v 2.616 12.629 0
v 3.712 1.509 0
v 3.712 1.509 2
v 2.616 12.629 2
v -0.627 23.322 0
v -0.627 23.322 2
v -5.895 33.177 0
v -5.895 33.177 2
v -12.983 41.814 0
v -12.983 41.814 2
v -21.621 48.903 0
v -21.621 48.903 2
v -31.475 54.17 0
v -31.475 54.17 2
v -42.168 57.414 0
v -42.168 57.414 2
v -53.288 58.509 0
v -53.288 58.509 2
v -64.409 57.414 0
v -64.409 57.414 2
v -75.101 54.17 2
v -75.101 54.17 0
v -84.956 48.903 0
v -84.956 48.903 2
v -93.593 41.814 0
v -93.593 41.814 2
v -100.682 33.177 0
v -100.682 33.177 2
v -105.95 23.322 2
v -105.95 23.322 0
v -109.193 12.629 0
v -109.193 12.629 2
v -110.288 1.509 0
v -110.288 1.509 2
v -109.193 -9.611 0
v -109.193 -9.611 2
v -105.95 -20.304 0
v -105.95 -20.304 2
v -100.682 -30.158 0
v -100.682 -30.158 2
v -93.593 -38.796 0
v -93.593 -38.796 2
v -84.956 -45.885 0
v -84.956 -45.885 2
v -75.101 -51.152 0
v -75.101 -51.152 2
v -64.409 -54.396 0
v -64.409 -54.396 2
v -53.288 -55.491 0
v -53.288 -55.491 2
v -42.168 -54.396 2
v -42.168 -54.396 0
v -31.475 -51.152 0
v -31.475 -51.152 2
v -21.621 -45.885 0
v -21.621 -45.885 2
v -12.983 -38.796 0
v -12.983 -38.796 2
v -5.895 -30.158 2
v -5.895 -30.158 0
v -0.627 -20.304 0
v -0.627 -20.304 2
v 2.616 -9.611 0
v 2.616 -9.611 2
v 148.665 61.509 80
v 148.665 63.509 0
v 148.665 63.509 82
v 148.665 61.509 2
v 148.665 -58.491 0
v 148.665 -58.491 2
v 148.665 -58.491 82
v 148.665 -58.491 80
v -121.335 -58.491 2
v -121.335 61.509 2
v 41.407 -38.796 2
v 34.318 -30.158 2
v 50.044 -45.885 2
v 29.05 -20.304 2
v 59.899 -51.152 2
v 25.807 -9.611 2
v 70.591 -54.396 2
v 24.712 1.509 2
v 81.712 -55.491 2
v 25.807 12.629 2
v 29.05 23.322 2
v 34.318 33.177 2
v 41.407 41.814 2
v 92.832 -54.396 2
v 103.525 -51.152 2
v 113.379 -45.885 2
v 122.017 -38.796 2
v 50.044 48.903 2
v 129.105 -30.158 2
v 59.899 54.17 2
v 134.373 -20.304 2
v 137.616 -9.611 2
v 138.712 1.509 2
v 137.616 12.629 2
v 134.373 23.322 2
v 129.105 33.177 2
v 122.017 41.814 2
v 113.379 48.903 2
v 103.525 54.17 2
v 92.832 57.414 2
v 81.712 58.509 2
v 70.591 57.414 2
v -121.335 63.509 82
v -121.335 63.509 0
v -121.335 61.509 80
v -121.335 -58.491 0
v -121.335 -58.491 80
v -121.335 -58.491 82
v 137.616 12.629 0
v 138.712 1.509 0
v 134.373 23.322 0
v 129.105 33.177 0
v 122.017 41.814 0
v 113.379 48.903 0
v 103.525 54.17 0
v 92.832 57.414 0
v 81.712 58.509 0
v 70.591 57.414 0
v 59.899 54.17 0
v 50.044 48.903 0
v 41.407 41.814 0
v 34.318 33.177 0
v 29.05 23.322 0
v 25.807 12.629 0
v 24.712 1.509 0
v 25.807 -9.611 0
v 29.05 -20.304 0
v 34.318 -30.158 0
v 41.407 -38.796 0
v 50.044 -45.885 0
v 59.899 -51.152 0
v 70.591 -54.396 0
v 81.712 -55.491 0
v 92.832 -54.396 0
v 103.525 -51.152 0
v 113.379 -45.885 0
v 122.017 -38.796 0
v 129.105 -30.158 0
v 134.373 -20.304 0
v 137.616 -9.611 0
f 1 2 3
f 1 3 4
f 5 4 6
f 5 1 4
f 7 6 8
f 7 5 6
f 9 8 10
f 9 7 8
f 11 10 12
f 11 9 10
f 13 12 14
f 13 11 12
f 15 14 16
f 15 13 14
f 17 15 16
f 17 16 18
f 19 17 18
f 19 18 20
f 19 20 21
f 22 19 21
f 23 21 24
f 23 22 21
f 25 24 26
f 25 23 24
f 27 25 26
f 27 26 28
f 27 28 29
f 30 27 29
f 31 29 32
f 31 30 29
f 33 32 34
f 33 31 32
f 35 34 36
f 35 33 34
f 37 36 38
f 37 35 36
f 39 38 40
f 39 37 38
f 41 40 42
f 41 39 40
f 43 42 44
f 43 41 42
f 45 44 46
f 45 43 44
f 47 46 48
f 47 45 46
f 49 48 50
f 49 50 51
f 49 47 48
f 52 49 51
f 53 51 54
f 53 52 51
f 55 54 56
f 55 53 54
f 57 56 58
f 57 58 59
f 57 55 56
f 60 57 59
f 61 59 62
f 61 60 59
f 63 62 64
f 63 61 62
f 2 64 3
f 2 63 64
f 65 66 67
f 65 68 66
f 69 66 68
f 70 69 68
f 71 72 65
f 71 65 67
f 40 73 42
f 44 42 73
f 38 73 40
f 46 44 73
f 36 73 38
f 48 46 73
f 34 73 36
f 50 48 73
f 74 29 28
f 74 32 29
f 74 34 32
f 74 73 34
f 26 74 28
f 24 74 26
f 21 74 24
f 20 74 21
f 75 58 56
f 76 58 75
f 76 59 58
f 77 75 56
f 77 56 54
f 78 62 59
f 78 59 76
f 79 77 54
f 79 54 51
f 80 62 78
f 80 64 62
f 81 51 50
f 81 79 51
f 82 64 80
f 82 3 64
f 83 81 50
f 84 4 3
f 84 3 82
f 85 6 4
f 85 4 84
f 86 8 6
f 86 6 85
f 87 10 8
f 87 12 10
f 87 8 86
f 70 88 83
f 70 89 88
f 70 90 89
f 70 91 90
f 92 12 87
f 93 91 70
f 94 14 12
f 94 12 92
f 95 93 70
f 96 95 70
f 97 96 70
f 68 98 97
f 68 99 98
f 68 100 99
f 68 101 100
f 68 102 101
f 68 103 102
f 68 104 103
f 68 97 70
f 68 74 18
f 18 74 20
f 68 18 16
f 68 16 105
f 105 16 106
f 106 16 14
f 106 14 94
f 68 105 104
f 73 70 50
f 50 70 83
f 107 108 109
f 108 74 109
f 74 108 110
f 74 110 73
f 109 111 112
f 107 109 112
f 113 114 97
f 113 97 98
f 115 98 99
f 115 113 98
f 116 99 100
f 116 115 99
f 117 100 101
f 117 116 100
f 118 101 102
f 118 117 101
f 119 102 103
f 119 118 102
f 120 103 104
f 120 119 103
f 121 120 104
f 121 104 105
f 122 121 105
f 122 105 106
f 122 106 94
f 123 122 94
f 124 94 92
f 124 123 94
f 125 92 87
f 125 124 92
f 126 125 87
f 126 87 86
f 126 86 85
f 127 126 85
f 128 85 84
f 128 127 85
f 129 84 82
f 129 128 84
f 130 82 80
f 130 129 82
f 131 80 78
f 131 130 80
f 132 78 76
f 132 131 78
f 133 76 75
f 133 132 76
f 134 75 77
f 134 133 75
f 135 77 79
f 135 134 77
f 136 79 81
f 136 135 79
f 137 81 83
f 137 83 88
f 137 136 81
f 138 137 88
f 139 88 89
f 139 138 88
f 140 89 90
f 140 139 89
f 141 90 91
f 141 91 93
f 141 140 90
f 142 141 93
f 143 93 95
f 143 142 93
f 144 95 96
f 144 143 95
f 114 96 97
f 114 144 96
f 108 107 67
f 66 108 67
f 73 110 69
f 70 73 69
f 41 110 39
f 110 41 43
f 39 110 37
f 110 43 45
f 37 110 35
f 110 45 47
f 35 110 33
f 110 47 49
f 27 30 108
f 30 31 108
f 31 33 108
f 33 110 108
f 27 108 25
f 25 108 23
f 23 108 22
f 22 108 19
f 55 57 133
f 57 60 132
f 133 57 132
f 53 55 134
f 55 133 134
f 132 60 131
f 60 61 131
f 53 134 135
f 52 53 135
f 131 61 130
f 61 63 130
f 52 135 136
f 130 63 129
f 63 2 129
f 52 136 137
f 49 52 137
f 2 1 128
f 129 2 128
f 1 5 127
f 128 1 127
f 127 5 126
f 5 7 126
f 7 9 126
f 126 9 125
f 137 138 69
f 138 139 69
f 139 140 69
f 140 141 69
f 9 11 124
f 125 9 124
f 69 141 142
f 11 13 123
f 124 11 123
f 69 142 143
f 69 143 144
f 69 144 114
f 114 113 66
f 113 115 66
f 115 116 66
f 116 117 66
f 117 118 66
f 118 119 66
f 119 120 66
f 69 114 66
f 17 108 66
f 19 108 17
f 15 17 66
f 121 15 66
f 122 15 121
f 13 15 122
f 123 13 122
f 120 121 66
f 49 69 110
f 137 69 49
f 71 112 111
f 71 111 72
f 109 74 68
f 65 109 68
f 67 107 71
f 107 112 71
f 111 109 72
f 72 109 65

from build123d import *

# Parameters (mm, degrees)
F0_W          = 270
F0_H          = 2
F0_H_2        = 120
F0_R          = 57
F1_DEPTH      = 2
F2_DEPTH      = 80
F3_W          = 270
F3_H          = 2
F4_DEPTH      = 120
F4_DEPTH_BACK = 2


with BuildPart() as f1:
    # F0 (on Top) → F1 (new body)
    with BuildSketch(Plane.XY):
        with Locations((13.665279, 62.509182)):
            Rectangle(F0_W, F0_H)
        with Locations((13.665279, 1.509182)):
            Rectangle(F0_W, F0_H_2)
        with Locations((-53.288383, 1.509182)):
            Circle(F0_R, mode=Mode.SUBTRACT)
        with Locations((81.711617, 1.509182)):
            Circle(F0_R, mode=Mode.SUBTRACT)
    extrude(amount=F1_DEPTH)

    # F0 (on Top) → F2 (join)
    with BuildSketch(Plane.XY):
        with Locations((13.665279, 62.509182)):
            Rectangle(F0_W, F0_H)
    extrude(amount=F2_DEPTH)

    # F3 (on face) → F4 (join, two sides)
    with BuildSketch(Plane.XZ.offset(-61.509182)) as f4_sk:
        with Locations((13.665279, 81)):
            Rectangle(F3_W, F3_H)
    extrude(amount=F4_DEPTH)
    extrude(f4_sk.sketch, amount=-F4_DEPTH_BACK)


solid = f1.part
